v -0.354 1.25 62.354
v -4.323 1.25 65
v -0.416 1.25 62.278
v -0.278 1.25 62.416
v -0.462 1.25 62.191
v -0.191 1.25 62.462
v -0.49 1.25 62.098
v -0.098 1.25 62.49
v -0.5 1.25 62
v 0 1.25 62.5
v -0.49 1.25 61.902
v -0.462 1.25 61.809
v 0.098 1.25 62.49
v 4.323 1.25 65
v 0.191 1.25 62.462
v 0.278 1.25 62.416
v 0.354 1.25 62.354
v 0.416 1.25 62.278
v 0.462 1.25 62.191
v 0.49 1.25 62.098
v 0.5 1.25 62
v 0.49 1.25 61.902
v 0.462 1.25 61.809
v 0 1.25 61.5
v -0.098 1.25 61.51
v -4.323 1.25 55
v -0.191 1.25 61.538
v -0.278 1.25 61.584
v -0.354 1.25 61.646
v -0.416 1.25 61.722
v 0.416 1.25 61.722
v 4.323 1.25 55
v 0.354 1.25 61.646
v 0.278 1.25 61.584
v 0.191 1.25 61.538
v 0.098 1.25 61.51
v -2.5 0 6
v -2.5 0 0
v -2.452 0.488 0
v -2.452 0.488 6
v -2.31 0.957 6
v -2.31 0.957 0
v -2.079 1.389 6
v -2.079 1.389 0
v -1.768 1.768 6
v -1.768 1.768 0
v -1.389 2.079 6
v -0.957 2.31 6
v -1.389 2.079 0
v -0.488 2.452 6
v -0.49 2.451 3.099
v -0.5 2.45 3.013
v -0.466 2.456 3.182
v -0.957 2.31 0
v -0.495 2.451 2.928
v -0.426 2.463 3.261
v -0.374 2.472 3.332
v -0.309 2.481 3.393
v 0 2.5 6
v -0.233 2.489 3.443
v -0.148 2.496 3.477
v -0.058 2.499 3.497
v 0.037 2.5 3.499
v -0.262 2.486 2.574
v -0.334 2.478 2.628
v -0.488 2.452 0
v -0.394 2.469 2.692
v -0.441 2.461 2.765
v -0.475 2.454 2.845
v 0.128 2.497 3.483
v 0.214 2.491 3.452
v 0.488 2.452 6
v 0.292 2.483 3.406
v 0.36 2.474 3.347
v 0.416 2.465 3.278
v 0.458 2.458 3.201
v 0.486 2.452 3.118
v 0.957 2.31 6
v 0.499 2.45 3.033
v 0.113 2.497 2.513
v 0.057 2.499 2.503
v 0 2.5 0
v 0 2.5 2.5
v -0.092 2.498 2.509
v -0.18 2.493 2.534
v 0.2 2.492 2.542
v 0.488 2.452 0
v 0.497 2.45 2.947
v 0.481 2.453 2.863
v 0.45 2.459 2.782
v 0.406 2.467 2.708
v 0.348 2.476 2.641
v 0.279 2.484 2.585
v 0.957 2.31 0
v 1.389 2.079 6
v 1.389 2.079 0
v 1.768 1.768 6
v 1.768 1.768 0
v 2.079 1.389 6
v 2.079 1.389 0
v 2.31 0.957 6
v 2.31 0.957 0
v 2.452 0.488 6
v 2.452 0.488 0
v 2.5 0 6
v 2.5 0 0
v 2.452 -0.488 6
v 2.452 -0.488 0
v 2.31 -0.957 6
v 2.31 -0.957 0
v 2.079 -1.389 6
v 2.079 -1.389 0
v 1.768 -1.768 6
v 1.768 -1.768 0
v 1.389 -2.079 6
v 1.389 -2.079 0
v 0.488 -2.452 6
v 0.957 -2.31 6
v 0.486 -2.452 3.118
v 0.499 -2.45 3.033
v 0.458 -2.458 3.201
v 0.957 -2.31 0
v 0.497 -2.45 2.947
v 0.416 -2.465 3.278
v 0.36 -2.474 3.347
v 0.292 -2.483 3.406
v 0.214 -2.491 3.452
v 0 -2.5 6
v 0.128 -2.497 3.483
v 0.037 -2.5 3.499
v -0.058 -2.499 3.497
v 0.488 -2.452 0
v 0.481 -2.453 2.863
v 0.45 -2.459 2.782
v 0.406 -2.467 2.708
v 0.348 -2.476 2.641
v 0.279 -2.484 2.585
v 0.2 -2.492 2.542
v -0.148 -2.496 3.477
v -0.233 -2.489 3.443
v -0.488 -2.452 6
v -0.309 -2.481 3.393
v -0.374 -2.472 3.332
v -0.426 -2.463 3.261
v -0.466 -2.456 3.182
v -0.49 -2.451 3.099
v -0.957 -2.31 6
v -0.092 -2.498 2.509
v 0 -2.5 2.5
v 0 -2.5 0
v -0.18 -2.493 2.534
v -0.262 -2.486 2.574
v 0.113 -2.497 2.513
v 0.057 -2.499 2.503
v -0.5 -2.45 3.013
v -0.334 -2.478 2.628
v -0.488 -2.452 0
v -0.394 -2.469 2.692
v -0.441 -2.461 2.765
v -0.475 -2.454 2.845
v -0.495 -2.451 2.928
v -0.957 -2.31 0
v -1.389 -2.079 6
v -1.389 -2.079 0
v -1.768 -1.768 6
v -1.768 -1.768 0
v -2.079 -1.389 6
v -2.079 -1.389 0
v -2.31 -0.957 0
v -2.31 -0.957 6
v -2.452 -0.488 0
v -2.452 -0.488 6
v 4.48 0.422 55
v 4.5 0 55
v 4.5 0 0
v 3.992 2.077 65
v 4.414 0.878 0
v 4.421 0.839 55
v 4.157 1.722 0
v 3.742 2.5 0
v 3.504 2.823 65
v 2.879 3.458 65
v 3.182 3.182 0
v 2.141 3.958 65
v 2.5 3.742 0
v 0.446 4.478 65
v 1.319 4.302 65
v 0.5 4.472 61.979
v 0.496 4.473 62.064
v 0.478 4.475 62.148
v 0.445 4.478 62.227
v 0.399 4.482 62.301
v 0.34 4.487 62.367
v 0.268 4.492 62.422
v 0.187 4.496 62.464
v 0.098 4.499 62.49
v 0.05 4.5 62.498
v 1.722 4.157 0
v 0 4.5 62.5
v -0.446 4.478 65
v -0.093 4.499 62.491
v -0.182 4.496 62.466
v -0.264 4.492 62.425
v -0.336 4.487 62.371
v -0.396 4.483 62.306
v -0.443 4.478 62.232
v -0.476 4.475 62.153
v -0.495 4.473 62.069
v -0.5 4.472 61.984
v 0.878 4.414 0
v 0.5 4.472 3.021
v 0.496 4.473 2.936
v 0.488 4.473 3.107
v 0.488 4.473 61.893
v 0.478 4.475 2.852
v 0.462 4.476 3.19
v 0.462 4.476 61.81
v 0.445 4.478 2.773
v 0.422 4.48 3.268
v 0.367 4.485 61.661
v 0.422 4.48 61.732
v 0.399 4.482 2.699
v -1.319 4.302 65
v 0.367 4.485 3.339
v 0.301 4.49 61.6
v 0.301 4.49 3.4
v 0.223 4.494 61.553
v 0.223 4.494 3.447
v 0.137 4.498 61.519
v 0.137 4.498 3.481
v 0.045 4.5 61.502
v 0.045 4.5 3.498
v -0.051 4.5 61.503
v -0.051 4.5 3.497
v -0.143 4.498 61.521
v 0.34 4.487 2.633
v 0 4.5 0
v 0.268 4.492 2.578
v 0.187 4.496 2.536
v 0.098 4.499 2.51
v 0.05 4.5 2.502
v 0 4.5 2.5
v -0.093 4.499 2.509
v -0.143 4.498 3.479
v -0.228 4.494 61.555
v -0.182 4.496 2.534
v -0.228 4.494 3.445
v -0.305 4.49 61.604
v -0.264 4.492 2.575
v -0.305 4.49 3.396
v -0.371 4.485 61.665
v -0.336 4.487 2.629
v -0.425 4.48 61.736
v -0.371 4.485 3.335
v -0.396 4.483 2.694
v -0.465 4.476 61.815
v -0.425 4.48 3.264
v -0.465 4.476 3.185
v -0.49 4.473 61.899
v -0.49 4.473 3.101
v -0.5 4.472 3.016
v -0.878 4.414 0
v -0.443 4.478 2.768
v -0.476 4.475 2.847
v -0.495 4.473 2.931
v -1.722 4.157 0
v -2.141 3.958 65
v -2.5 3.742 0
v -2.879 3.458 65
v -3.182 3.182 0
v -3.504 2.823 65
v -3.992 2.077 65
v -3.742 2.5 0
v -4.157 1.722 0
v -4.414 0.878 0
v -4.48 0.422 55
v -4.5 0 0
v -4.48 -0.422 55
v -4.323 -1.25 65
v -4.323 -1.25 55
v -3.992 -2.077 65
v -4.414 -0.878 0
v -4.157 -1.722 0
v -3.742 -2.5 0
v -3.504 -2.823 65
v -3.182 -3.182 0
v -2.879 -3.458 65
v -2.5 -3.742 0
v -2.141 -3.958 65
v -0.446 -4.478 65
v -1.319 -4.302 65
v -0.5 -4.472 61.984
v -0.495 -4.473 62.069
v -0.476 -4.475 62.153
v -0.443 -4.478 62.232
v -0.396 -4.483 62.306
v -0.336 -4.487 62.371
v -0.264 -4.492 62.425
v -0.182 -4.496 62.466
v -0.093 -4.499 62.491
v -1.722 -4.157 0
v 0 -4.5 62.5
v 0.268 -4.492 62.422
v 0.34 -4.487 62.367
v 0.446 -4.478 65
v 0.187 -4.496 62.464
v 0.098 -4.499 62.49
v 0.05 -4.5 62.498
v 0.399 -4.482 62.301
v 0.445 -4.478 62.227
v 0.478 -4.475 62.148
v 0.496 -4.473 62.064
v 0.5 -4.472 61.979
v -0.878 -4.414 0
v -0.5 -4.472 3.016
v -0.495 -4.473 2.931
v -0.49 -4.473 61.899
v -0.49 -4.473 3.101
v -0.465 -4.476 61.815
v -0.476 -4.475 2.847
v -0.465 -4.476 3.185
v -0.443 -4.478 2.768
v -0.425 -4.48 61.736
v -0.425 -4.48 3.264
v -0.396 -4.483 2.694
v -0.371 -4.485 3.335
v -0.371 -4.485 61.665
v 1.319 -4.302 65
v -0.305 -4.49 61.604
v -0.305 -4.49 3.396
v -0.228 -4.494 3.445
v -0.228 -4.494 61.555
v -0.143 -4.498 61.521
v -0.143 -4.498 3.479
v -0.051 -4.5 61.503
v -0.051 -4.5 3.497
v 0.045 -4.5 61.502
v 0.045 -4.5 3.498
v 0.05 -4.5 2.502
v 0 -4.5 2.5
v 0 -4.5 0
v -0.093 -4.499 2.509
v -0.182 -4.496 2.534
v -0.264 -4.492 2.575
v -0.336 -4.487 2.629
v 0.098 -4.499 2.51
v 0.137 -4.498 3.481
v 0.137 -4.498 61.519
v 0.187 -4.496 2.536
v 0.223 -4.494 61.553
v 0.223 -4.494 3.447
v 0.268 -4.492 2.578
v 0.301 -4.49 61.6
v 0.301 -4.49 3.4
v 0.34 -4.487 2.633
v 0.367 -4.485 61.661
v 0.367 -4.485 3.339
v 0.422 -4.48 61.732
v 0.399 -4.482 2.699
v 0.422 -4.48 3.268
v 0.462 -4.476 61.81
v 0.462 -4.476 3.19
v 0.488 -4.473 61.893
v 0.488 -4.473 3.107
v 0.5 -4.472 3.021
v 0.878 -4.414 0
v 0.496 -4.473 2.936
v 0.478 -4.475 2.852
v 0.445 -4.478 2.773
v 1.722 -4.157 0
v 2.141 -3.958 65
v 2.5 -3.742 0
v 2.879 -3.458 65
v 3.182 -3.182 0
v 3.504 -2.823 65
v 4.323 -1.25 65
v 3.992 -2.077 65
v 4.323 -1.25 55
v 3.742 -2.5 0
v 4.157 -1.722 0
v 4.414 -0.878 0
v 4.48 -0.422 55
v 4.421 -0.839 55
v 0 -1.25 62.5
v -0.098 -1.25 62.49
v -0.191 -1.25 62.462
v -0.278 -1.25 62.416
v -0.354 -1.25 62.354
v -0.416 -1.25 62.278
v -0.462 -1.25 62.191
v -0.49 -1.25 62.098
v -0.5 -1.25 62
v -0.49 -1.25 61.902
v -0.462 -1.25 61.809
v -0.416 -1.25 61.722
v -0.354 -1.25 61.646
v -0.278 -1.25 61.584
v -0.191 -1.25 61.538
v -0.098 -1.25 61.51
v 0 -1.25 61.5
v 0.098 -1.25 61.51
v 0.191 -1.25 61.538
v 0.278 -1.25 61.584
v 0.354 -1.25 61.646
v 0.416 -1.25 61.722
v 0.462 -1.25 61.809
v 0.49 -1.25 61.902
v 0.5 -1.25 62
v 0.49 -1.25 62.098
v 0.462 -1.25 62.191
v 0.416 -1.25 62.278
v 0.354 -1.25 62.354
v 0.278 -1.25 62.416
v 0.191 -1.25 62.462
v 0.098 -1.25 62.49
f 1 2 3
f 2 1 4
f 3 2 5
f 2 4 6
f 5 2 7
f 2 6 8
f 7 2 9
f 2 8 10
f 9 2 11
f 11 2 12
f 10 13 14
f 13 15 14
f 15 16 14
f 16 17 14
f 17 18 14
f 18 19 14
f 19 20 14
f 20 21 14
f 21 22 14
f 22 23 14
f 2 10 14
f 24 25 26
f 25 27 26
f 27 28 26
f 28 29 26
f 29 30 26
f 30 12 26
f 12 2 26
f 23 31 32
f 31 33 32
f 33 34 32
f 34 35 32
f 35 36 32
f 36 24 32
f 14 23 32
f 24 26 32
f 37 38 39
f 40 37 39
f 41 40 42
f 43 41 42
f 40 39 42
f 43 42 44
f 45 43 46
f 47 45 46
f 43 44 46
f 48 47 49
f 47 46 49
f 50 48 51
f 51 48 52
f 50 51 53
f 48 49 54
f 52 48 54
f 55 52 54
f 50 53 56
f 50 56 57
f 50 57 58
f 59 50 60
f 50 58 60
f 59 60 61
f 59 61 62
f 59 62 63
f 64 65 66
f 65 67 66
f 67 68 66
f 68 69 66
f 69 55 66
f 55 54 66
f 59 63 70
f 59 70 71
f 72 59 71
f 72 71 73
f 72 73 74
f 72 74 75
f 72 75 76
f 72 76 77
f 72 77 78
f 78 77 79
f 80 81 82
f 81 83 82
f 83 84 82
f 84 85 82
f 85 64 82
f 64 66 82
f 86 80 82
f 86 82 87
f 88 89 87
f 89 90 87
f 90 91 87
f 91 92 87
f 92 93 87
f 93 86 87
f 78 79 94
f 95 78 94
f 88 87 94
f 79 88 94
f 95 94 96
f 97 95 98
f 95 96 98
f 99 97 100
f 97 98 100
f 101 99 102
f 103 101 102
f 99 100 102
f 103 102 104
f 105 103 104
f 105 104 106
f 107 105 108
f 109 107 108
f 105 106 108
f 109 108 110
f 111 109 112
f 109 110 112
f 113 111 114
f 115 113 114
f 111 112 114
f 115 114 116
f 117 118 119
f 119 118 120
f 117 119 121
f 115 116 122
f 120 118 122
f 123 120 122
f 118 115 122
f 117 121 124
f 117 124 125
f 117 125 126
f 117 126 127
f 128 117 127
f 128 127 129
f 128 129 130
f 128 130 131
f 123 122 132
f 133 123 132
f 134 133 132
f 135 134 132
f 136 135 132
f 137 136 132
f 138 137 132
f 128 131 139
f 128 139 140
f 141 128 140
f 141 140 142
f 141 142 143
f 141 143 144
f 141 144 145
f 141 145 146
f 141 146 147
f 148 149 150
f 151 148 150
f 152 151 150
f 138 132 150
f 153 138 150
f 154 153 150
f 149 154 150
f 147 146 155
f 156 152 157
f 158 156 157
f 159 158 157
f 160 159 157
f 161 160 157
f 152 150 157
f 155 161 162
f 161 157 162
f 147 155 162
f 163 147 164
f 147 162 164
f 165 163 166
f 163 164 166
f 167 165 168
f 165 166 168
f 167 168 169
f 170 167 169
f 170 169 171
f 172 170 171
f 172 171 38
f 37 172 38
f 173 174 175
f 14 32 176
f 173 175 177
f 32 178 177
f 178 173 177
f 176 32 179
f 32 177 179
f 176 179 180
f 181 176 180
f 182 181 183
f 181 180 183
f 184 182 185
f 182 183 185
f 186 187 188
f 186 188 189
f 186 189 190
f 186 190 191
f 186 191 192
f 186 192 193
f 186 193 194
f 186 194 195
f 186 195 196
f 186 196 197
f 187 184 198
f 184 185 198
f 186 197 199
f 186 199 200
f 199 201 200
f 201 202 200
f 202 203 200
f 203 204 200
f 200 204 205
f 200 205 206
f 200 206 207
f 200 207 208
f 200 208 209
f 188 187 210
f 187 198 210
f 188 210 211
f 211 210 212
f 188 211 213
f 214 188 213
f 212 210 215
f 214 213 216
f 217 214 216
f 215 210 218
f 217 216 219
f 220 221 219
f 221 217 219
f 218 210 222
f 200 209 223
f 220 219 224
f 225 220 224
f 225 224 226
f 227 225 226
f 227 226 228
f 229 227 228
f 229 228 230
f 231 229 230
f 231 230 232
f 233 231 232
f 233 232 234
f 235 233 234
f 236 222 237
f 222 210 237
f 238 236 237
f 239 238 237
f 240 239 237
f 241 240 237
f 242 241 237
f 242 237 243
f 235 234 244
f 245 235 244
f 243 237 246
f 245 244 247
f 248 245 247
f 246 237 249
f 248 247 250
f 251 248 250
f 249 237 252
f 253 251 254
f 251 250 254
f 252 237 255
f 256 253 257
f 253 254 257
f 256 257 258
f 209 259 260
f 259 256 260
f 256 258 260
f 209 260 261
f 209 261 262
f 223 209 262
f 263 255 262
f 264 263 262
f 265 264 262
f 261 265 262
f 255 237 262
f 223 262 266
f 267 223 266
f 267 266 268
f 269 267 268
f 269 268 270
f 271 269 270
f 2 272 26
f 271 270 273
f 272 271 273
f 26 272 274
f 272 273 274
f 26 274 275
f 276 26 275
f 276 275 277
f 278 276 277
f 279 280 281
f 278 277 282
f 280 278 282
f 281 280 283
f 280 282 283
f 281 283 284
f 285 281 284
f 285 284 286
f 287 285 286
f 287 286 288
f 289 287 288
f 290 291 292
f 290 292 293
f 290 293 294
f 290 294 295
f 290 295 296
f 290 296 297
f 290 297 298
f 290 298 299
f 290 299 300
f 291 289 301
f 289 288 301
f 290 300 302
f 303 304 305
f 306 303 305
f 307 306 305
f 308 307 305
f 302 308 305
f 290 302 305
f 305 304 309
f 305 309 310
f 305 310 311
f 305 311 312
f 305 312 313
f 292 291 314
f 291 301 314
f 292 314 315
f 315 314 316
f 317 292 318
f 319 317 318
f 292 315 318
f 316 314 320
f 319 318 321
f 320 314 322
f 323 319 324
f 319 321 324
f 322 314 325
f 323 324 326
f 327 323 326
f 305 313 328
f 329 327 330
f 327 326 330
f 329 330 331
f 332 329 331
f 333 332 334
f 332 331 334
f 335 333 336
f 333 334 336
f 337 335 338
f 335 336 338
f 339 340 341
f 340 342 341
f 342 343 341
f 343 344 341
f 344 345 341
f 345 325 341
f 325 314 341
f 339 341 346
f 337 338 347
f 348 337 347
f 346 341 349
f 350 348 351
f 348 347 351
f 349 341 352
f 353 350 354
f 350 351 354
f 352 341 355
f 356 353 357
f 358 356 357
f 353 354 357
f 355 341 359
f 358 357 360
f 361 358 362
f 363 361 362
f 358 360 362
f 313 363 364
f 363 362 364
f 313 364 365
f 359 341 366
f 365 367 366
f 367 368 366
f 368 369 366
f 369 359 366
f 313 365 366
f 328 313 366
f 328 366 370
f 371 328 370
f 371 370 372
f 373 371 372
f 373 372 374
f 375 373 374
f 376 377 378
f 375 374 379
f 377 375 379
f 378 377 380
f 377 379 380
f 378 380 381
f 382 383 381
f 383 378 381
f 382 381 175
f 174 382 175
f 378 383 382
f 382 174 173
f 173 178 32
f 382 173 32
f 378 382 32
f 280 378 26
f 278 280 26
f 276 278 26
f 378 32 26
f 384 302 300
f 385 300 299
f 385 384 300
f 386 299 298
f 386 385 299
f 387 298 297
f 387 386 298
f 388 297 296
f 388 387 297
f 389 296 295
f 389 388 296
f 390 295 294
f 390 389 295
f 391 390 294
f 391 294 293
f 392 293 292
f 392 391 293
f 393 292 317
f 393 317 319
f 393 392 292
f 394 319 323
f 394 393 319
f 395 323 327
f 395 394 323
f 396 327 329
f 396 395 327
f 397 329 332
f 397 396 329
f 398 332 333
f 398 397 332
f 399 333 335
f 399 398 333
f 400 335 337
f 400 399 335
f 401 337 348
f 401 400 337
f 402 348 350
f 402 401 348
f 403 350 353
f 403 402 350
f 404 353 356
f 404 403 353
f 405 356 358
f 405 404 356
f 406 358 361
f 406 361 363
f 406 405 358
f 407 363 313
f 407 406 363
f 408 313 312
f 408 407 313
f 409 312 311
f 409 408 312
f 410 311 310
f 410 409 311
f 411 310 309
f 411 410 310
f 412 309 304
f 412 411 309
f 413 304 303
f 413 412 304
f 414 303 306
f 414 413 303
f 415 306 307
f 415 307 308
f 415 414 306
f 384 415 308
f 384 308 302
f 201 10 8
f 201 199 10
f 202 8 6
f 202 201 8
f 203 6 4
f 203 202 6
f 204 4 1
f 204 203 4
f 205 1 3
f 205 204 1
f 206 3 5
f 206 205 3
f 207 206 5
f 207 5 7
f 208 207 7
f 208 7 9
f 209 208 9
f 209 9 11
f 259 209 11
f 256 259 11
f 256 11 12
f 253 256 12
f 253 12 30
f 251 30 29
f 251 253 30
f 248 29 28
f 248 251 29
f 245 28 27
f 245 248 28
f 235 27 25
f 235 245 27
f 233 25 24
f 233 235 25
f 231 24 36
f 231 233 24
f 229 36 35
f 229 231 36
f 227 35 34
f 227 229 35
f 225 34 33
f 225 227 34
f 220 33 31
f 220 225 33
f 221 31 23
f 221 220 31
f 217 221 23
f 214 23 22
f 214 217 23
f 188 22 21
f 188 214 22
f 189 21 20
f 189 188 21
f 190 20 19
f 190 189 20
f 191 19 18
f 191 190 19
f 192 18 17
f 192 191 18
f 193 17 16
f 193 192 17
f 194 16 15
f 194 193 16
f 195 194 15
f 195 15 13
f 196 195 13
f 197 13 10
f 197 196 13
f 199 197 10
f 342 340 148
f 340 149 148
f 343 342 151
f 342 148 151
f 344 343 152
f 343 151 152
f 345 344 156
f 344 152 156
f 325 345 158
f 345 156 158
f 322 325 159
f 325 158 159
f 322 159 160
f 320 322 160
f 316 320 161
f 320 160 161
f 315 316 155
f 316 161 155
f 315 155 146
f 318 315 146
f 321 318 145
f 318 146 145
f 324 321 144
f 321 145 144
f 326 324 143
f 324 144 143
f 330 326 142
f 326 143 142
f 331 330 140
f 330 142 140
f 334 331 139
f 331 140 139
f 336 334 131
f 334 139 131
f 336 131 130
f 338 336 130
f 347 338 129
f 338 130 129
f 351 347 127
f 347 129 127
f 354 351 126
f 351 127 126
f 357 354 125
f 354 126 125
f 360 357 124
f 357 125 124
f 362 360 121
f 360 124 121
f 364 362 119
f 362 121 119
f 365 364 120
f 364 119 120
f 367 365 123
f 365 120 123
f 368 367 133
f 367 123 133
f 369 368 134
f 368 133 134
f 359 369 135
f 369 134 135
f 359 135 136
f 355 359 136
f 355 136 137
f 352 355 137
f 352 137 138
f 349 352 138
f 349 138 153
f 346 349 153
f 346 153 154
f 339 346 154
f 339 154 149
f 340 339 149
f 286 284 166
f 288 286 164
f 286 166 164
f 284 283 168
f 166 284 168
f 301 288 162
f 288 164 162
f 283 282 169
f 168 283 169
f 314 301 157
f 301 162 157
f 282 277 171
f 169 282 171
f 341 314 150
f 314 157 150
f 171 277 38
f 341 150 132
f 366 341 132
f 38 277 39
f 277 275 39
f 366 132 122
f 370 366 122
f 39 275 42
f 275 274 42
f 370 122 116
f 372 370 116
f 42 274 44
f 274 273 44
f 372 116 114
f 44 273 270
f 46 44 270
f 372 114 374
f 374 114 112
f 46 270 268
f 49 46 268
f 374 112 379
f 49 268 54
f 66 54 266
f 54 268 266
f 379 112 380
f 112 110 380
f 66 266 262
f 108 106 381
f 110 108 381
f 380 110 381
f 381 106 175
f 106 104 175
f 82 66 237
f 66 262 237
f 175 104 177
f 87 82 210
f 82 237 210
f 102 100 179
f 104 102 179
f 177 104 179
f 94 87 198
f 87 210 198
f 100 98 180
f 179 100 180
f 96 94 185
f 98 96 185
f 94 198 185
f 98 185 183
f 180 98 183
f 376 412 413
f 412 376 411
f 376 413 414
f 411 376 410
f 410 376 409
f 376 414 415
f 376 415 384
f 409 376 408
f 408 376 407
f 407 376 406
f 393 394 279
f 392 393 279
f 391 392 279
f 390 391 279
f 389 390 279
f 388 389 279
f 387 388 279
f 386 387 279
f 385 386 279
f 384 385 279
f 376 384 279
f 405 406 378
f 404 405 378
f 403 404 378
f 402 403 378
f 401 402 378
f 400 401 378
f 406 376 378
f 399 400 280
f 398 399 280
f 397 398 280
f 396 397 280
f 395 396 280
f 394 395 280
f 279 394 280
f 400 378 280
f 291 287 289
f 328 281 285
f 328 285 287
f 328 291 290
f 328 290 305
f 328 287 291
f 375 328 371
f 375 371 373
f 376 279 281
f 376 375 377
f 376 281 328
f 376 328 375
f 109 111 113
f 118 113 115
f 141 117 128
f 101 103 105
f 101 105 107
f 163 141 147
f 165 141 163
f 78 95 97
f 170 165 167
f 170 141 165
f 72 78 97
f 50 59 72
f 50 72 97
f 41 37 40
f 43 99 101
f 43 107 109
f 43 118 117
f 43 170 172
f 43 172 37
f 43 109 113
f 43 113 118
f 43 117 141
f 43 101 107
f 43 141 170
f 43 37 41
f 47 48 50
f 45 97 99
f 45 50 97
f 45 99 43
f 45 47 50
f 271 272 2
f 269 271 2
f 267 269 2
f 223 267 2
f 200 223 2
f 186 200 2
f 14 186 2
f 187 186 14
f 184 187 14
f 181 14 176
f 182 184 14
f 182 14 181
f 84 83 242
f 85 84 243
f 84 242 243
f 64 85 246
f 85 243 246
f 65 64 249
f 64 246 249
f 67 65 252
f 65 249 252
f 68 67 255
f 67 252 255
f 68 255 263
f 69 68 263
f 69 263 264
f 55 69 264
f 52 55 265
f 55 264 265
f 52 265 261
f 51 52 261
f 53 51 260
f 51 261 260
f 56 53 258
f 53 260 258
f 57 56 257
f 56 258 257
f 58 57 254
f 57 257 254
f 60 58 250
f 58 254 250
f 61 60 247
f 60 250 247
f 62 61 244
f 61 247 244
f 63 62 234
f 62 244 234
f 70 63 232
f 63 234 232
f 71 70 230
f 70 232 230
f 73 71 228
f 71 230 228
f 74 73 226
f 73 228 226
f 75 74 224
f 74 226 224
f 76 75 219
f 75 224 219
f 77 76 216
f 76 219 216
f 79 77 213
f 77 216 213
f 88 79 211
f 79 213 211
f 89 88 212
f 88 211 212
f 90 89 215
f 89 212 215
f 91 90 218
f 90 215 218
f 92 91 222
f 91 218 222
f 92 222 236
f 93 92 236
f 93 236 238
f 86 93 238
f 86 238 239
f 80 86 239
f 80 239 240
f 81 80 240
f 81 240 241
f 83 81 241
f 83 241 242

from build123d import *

# Parameters (mm, degrees)
SZKIC1_R                    = 4.5
DODANIE_WYCI_GNI_CIE1_DEPTH = 65
WYTNIJ_WYCI_GNI_CIE1_START  = -10
WYTNIJ_WYCI_GNI_CIE1_DEPTH  = 10
SZKIC3_R                    = 2.5
WYTNIJ_WYCI_GNI_CIE3_DEPTH  = 6
SZKIC4_R                    = 0.5
WYTNIJ_WYCI_GNI_CIE4_DEPTH  = 66.310795432


with BuildPart() as part:
    # Szkic1 → Dodanie-wyciągnięcie1 (new body)
    with BuildSketch(Plane.XY):
        Circle(SZKIC1_R)
    extrude(amount=DODANIE_WYCI_GNI_CIE1_DEPTH)

    # Szkic2 → Wytnij-wyciągnięcie1 (cut)
    with BuildSketch(Plane.XY.offset(65).offset(WYTNIJ_WYCI_GNI_CIE1_START)):
        with BuildLine():
            Line((-4.322904116, 1.25), (4.322904116, 1.25))
            ThreePointArc((4.322904116, 1.25), (4.5, 0), (4.322904116, -1.25))
            Line((4.322904116, -1.25), (-4.322904116, -1.25))
            ThreePointArc((-4.322904116, -1.25), (-4.5, 0), (-4.322904116, 1.25))
        make_face()
    extrude(amount=WYTNIJ_WYCI_GNI_CIE1_DEPTH, mode=Mode.SUBTRACT)

    # Szkic3 → Wytnij-wyciągnięcie3 (cut)
    with BuildSketch(Plane(origin=(0, 0, 0), x_dir=(-1, 0, 0), z_dir=(0, 0, -1))):
        Circle(SZKIC3_R)
    extrude(amount=-WYTNIJ_WYCI_GNI_CIE3_DEPTH, mode=Mode.SUBTRACT)

    # Szkic4 → Wytnij-wyciągnięcie4 (cut, symmetric)
    with BuildSketch(Plane(origin=(0, 0, 0), x_dir=(1, 0, 0), z_dir=(0, 1, 0))):
        with Locations(Location((0, -3, 0), (0, 0, 90))):
            Circle(SZKIC4_R)
    wytnij_wyci_gni_cie4 = extrude(amount=WYTNIJ_WYCI_GNI_CIE4_DEPTH, both=True, mode=Mode.SUBTRACT)

    # Lustro1: Wytnij-wyciągnięcie4 across plane
    add(wytnij_wyci_gni_cie4.mirror(Plane(origin=(0, 0, 32.5), x_dir=(1, 0, 0), z_dir=(0, 0, -1))), mode=Mode.SUBTRACT)


solid = part.part
